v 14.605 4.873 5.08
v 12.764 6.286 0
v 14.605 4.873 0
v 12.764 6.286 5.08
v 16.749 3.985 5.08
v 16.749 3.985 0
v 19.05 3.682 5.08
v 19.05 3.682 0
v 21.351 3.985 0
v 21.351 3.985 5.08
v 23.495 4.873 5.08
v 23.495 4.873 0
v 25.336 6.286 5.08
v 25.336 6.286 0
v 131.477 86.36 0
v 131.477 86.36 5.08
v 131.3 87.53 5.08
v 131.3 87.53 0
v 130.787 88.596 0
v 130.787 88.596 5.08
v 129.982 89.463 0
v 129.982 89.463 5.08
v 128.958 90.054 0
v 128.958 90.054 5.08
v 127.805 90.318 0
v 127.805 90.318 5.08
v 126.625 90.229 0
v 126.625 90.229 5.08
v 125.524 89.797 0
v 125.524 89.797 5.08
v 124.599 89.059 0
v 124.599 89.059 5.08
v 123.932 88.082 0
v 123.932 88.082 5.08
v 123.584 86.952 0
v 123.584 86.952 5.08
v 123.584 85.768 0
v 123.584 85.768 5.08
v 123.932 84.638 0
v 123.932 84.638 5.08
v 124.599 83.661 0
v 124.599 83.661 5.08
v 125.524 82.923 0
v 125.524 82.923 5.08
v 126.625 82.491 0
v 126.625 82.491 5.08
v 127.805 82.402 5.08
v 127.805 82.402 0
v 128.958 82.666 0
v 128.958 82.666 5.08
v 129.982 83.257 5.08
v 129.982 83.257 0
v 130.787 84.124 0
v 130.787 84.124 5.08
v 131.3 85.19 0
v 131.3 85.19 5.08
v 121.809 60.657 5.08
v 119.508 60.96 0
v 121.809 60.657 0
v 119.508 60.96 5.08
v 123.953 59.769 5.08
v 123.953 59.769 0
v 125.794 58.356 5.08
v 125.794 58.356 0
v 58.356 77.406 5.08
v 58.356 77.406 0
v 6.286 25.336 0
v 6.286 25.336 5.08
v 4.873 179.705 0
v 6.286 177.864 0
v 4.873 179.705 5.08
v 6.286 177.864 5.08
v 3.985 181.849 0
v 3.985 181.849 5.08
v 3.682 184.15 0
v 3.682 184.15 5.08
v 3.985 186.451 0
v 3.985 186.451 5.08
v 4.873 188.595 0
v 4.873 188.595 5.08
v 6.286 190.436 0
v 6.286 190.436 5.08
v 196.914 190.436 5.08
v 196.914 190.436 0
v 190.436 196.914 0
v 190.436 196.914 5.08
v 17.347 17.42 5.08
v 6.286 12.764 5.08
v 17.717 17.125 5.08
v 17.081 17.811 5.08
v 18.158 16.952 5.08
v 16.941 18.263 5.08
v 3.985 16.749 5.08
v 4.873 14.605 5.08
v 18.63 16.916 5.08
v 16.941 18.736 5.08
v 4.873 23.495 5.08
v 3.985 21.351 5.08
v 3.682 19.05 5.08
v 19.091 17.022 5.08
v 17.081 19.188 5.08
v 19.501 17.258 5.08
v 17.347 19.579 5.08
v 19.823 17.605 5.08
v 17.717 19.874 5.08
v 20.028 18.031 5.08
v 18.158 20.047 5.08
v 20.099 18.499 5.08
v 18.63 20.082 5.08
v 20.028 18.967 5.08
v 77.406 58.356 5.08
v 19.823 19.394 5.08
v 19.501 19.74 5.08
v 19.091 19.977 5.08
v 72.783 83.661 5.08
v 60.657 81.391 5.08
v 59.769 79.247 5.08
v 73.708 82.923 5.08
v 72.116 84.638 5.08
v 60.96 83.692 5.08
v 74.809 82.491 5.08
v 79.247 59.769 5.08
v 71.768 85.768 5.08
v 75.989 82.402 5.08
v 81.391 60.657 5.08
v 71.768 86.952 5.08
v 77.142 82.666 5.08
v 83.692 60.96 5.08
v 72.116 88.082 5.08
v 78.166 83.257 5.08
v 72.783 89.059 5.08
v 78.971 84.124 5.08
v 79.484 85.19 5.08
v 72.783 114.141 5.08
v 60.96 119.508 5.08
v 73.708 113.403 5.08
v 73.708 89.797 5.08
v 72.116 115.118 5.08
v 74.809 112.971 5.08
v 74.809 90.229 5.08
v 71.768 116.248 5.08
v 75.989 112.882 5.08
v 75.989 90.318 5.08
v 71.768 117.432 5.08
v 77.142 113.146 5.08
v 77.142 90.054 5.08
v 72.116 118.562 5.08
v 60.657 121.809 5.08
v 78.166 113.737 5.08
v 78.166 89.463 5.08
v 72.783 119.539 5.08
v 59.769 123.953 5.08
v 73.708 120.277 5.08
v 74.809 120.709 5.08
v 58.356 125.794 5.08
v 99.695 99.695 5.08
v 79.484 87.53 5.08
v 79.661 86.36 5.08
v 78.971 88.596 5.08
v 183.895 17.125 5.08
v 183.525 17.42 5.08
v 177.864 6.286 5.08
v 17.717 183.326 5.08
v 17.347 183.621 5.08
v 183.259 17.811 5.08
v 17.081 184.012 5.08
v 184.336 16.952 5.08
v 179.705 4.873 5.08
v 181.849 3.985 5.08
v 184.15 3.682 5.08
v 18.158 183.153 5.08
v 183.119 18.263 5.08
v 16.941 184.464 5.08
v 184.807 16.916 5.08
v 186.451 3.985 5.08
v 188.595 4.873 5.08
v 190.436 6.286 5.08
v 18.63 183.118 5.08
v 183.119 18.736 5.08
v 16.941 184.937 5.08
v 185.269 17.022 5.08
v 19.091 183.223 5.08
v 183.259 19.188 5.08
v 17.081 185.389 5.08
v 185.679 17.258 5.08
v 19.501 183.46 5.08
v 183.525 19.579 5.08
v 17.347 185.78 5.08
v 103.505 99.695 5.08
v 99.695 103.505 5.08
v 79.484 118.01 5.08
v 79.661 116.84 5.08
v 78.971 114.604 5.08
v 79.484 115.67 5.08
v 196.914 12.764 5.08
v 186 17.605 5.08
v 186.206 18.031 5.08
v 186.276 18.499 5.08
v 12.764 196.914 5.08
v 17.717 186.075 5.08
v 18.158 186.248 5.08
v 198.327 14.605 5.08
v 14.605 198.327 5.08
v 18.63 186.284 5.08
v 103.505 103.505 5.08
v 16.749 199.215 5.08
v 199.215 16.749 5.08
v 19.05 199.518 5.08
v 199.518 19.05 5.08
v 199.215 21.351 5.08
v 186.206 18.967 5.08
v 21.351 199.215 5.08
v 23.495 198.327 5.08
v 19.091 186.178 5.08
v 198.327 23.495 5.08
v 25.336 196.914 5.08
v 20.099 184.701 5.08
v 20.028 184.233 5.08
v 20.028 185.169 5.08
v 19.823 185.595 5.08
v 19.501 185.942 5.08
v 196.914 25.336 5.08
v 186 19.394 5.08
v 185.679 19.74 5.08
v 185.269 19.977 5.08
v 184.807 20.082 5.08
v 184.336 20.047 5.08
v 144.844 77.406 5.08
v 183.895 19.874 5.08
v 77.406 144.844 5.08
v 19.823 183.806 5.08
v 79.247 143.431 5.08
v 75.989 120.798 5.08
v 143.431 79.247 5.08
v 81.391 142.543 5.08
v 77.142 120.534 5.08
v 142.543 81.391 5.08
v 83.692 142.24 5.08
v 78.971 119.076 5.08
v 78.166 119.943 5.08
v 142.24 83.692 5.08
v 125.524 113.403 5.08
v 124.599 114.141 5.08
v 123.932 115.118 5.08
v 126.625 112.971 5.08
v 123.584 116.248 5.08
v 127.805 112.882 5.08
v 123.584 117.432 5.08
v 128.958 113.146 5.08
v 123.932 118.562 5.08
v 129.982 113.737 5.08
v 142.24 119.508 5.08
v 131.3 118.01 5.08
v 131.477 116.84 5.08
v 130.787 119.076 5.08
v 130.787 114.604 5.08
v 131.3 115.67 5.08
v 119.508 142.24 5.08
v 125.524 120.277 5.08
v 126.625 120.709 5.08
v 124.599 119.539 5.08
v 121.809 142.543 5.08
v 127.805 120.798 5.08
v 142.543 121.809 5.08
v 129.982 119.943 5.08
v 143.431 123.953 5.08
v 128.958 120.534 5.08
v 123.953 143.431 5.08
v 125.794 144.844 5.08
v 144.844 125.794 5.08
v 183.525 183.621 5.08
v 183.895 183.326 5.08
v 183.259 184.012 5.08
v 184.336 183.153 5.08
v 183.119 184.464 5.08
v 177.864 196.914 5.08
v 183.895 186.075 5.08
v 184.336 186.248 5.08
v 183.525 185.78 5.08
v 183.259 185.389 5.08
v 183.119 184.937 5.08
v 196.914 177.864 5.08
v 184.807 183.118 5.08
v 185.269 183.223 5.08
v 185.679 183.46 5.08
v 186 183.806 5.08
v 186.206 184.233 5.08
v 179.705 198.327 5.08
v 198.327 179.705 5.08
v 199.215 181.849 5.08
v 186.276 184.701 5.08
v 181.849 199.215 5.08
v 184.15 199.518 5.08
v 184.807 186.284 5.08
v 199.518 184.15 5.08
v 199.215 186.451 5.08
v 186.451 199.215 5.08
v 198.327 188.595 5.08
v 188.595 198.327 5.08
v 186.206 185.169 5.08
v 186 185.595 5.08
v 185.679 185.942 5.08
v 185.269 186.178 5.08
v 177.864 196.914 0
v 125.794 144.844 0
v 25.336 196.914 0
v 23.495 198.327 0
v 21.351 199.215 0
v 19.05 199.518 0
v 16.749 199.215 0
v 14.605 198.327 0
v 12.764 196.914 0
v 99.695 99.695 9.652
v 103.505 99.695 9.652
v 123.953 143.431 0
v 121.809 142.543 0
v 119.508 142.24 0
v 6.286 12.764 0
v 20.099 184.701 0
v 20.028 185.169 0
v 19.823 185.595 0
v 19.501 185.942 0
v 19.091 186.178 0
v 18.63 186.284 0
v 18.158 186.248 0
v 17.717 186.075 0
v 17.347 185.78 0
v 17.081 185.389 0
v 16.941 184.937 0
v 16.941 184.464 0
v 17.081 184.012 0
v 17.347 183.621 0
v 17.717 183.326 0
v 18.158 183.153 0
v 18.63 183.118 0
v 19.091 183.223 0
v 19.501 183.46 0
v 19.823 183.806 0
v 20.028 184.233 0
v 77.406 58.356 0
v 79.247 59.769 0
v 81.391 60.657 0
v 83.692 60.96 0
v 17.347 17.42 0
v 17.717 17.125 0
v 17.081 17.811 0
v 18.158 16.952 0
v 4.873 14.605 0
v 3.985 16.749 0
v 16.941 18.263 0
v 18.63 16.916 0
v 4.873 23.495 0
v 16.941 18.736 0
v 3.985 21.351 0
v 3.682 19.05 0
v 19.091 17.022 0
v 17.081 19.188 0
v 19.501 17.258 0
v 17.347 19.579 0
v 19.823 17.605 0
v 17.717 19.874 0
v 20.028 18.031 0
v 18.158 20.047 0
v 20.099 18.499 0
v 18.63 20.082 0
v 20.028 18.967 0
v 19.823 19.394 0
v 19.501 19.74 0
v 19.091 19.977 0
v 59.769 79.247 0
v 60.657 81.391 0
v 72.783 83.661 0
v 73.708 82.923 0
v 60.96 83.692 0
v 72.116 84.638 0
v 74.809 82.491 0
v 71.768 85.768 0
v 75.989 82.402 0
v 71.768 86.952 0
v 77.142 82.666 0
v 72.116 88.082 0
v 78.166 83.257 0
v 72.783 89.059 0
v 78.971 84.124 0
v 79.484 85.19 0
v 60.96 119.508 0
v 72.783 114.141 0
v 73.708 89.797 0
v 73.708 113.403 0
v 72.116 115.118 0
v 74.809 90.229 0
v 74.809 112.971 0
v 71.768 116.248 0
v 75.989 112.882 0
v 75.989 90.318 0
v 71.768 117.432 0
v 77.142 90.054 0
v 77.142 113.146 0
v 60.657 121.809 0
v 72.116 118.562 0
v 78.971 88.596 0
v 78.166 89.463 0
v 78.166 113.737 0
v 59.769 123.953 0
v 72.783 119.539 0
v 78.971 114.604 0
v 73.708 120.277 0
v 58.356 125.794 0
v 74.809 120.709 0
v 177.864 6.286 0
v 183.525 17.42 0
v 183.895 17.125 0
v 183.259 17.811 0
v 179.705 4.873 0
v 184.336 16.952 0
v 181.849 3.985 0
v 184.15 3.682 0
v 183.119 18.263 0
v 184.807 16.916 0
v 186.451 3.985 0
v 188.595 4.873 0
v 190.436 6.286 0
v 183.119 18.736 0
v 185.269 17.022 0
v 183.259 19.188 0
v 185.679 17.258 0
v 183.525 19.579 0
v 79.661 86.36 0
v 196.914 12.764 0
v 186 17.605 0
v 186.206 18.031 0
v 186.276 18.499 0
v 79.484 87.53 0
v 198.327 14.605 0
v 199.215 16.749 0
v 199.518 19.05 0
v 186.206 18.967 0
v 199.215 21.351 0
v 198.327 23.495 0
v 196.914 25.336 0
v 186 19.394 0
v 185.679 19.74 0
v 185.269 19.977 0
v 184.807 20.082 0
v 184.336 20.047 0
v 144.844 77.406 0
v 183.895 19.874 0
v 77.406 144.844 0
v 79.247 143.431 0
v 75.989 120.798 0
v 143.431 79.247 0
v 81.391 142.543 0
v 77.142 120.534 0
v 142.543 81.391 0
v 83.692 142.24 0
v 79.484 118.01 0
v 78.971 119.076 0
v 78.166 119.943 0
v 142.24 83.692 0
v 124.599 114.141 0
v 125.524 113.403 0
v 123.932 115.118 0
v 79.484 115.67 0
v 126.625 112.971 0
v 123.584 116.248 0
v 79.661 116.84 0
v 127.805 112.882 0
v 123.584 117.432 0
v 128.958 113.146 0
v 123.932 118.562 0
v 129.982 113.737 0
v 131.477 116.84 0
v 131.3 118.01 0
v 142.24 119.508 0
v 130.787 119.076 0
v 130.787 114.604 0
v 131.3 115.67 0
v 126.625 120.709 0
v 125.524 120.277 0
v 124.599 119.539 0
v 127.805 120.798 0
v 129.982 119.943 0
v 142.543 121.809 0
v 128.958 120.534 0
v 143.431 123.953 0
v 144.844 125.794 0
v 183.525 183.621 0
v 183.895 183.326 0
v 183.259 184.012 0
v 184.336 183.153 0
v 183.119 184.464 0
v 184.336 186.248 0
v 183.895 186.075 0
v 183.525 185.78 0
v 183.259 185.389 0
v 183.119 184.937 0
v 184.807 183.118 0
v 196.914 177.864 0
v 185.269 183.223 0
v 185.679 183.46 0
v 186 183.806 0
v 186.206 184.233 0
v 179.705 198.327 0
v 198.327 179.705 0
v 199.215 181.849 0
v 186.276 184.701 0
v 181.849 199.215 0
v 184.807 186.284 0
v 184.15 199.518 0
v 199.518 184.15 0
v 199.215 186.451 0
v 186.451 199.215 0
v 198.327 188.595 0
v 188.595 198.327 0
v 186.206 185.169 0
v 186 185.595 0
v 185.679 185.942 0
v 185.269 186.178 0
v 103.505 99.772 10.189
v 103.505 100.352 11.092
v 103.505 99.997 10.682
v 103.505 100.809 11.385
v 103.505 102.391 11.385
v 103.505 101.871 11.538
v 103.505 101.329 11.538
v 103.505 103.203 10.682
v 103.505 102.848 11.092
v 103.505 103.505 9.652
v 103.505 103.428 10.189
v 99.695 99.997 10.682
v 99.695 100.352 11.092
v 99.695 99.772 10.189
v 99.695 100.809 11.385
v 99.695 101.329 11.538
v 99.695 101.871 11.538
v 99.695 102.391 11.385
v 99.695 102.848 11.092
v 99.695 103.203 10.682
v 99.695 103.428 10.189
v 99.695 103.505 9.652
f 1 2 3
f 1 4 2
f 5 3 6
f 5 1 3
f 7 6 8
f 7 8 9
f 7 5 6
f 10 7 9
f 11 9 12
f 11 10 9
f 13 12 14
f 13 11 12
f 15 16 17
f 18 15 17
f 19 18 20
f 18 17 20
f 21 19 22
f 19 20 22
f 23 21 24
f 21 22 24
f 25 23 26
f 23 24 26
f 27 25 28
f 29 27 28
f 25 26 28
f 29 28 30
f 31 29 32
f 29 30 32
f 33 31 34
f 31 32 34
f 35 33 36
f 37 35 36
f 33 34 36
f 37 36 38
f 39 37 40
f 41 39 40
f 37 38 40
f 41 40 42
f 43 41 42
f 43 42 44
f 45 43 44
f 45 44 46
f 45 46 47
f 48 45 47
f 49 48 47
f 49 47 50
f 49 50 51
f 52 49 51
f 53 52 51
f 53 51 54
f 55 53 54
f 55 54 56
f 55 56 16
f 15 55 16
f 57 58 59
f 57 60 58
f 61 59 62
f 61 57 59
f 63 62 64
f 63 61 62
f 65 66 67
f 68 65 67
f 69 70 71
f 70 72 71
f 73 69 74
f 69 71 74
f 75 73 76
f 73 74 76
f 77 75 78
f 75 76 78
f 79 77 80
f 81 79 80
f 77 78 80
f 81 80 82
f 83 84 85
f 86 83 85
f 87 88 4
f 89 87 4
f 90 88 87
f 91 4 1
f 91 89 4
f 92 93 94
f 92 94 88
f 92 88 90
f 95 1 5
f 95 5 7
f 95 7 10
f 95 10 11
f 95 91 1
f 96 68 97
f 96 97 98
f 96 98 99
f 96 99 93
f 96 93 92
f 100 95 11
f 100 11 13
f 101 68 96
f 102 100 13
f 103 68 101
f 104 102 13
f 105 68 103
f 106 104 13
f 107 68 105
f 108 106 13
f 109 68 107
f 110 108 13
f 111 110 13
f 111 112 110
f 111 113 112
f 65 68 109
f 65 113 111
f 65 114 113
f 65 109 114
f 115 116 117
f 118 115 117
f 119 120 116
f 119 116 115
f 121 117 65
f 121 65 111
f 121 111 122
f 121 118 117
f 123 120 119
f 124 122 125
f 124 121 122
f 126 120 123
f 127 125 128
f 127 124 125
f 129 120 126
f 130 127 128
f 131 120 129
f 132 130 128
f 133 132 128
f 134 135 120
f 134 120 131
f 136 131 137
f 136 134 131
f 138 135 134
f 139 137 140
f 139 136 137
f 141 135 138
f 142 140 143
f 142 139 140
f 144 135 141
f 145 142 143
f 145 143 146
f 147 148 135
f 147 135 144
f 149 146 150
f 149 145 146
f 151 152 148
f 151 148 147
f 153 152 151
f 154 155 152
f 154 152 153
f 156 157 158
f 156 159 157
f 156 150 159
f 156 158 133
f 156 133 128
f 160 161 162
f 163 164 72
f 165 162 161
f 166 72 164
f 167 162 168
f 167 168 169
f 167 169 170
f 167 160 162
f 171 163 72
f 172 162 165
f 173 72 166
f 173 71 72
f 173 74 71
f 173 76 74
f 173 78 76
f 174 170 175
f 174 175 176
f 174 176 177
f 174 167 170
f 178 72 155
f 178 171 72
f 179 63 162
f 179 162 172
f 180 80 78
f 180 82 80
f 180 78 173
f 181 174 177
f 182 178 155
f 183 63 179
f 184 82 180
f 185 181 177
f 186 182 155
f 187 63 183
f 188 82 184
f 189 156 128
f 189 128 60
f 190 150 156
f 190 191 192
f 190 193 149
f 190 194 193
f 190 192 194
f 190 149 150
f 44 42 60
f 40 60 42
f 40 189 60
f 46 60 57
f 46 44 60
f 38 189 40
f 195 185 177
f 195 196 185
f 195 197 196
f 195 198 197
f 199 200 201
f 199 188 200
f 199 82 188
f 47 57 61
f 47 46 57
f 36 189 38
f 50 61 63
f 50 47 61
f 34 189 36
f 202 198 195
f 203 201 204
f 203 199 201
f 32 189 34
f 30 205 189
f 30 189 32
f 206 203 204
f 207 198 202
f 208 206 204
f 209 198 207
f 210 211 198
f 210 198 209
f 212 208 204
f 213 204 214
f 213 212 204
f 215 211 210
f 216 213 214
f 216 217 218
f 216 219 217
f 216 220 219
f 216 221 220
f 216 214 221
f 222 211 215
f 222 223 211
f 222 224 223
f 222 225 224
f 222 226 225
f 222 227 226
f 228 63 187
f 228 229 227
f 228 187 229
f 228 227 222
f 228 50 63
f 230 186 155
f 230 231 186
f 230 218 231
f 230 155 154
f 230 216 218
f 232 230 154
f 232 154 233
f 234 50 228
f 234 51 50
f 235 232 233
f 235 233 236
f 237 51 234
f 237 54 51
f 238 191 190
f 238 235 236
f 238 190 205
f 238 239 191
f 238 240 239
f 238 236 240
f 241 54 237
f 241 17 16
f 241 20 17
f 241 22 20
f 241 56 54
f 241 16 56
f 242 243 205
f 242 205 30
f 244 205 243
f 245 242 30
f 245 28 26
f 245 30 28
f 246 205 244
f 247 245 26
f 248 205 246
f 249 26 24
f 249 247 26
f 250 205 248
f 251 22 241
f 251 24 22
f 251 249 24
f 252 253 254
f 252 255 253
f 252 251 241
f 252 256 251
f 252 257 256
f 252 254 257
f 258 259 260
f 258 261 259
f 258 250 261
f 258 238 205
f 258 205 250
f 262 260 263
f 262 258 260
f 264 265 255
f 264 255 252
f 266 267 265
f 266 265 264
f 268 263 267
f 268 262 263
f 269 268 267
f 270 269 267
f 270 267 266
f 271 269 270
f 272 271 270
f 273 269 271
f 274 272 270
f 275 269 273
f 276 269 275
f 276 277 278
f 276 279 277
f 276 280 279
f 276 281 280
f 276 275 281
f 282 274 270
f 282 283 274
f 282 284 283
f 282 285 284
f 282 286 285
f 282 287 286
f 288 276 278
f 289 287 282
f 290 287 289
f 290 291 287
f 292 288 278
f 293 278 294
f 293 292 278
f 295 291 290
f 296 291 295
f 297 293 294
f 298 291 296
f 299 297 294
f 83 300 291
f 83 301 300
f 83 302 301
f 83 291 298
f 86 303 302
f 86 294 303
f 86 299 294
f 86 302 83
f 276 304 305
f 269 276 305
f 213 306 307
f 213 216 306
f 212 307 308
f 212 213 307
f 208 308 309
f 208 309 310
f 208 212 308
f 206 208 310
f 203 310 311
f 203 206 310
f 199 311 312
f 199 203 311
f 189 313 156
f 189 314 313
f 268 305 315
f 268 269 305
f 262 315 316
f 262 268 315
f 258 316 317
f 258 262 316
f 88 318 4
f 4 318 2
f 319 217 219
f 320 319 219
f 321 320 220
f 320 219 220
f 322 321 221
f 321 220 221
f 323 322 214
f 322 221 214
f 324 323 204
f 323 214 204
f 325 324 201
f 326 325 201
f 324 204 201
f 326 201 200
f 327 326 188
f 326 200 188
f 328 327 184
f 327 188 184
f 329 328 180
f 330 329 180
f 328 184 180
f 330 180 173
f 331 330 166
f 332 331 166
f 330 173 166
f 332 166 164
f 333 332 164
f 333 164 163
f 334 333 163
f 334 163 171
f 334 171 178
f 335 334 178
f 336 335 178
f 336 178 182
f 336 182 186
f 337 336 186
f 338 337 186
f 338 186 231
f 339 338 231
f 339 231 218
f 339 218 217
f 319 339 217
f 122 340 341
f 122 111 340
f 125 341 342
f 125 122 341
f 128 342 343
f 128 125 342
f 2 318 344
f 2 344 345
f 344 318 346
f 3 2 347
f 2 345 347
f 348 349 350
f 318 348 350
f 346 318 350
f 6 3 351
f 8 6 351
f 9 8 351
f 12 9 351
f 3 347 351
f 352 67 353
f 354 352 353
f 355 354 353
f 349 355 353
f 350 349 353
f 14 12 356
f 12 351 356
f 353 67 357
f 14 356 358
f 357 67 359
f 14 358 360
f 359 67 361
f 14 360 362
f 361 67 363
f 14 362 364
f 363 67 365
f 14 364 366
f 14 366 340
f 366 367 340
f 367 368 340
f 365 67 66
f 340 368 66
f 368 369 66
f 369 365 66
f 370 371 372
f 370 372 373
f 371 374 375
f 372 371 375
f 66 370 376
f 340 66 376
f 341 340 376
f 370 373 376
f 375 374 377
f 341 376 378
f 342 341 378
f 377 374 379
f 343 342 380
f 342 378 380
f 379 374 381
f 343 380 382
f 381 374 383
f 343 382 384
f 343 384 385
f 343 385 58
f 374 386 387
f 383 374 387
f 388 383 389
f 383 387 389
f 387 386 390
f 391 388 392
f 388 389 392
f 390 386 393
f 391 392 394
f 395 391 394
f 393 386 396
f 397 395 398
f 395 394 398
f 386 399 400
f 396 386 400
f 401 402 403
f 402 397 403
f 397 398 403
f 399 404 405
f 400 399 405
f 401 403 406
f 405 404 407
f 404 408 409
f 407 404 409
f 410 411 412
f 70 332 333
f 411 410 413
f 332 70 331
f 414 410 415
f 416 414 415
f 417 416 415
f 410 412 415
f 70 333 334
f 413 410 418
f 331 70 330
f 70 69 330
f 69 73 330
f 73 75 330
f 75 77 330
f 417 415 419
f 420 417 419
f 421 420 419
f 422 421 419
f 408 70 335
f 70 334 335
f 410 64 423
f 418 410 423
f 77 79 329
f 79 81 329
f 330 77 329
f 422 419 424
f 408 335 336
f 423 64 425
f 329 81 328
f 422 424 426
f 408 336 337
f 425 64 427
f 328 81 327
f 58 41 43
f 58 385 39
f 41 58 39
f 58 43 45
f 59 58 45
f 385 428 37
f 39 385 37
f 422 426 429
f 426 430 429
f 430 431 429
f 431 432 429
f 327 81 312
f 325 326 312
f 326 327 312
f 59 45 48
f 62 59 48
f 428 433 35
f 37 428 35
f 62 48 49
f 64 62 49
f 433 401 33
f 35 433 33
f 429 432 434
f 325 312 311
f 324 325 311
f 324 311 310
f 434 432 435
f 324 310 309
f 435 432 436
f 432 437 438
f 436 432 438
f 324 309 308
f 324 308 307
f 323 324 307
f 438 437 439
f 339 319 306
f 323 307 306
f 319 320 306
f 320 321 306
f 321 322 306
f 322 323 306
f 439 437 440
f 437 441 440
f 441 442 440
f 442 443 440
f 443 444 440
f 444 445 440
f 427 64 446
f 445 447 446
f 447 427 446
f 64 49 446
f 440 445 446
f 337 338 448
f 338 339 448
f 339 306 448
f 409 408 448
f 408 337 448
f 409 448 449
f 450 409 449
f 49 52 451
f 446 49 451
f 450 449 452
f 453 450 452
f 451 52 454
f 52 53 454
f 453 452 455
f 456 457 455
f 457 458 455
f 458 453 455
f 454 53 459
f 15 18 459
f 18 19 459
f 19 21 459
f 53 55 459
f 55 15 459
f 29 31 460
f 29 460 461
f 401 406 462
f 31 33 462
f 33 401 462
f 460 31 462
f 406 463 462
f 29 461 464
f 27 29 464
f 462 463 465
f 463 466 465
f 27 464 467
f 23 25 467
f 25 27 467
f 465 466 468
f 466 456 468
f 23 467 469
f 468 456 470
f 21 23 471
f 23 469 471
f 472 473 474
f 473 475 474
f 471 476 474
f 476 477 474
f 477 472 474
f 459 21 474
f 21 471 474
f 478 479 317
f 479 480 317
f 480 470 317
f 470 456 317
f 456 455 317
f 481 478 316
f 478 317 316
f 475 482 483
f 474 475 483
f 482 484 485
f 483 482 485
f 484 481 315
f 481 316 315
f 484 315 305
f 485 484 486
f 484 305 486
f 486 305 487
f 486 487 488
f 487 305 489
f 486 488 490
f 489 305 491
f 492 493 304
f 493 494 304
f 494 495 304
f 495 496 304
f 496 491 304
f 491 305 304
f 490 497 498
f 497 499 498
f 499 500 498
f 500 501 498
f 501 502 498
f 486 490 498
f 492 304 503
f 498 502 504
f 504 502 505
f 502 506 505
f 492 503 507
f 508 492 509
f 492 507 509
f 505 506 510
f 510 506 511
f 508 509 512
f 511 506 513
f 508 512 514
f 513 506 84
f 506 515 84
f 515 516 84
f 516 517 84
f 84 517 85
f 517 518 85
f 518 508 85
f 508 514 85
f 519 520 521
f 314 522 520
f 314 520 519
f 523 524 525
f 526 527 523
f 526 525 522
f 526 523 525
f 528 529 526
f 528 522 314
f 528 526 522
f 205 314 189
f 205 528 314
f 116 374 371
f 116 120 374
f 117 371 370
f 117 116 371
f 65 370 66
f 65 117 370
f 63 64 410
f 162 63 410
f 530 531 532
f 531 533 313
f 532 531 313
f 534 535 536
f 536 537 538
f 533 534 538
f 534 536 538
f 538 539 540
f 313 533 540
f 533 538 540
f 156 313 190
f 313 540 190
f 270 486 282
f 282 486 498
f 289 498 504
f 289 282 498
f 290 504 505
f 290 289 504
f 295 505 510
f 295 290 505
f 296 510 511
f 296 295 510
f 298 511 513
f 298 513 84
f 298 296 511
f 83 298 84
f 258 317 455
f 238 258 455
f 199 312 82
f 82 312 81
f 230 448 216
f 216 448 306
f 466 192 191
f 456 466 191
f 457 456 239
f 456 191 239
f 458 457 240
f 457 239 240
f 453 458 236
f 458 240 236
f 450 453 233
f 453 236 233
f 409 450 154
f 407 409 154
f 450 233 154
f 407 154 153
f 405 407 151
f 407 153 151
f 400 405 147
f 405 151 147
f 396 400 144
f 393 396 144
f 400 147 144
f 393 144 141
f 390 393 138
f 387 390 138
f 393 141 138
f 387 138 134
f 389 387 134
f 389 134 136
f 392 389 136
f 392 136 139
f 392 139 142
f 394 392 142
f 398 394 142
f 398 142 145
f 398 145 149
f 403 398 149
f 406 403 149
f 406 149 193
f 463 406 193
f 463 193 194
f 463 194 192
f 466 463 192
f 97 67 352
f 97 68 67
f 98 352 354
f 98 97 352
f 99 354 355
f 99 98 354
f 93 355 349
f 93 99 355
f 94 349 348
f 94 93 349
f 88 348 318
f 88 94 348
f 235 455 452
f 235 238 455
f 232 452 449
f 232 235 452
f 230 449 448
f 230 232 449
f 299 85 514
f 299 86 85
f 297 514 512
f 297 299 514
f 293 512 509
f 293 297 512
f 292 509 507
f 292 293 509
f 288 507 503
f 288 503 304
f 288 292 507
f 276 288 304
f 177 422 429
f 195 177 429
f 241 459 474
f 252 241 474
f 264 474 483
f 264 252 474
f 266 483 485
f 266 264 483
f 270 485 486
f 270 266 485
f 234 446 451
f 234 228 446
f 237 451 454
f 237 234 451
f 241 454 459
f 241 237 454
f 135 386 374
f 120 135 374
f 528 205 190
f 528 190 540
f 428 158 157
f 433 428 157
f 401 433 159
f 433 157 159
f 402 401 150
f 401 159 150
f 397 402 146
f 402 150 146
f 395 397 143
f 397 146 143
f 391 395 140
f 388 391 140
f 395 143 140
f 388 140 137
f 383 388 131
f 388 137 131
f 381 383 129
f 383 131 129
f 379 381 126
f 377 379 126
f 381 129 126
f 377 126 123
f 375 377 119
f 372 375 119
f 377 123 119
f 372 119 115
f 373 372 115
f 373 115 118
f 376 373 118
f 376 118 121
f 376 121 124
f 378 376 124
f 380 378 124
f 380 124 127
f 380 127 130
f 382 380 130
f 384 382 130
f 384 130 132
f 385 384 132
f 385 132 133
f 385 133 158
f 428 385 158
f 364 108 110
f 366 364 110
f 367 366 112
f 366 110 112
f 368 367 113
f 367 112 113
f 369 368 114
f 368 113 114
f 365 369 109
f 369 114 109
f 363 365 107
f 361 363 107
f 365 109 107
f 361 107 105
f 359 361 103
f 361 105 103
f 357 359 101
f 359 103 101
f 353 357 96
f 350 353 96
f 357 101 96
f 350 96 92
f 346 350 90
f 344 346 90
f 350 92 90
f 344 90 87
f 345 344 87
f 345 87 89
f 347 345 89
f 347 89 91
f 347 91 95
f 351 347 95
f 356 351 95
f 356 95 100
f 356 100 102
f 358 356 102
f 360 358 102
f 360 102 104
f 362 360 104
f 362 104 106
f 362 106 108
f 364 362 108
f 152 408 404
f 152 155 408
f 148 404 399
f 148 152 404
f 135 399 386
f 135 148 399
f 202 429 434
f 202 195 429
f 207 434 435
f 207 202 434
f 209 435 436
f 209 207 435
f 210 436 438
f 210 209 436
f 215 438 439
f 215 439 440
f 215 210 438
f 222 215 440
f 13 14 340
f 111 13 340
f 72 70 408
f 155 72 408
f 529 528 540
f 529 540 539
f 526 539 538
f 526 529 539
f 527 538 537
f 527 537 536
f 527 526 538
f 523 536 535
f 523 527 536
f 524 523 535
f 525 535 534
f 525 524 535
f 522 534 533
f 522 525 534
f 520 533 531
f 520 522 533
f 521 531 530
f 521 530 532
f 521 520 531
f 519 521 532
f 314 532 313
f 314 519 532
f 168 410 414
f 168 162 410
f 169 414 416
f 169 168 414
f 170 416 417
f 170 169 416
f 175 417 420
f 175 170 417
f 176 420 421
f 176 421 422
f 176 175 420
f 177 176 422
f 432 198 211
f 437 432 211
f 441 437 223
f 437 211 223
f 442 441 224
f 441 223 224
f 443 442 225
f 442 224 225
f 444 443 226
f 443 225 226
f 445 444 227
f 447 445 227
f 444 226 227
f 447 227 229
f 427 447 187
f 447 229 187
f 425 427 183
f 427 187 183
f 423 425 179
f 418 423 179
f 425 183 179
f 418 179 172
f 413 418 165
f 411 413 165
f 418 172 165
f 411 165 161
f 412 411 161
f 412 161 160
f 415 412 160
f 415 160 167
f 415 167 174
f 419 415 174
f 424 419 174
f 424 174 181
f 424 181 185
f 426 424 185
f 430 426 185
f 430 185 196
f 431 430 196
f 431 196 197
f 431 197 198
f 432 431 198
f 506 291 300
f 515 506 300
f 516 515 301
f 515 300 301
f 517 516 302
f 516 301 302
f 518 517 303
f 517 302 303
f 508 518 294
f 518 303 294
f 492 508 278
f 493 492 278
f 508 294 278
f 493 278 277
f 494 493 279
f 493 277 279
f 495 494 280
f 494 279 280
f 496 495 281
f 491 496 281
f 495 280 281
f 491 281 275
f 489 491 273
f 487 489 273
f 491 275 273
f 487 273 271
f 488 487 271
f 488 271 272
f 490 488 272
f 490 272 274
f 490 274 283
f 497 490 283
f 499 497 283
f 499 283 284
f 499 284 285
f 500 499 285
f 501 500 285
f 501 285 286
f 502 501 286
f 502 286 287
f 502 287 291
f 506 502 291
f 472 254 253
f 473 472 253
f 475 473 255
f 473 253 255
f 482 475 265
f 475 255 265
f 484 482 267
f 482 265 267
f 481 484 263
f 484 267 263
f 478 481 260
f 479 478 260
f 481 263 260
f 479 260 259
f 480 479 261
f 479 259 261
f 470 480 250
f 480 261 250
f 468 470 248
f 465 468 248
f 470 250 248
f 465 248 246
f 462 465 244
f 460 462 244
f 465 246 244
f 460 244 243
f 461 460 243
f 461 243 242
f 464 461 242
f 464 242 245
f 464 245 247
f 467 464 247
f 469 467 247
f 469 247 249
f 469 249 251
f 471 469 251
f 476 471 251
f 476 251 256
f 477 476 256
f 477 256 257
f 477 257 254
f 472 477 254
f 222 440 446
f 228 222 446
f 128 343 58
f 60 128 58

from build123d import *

# Parameters (mm, degrees)
BOSS_EXTRUDE1_DEPTH = 5.08
FILLET1_R           = 8.89
SKETCH2_R           = 3.96875
CUT_EXTRUDE1_DEPTH  = 6.08
SKETCH3_R           = 1.5875
CUT_EXTRUDE2_DEPTH  = 6.08
BOSS_EXTRUDE3_DEPTH = 1.905


with BuildPart() as part:
    # Sketch1 → Boss-Extrude1 (new body)
    with BuildSketch(Plane.XY):
        Polygon((0, 184.15), (60.96, 123.19), (60.96, 80.01), (0, 19.05), (19.05, 0), (80.01, 60.96), (123.19, 60.96), (184.15, 0), (203.2, 19.05), (142.24, 80.01), (142.24, 123.19), (203.2, 184.15), (184.15, 203.2), (123.19, 142.24), (80.01, 142.24), (19.05, 203.2), align=None)
    extrude(amount=BOSS_EXTRUDE1_DEPTH)

    # Fillet1
    fillet1_edges = [part.edges().sort_by_distance(p)[0] for p in [
        (19.05, 203.2, 2.54),
        (80.01, 142.24, 2.54),
        (123.19, 142.24, 2.54),
        (184.15, 203.2, 2.54),
        (203.2, 184.15, 2.54),
        (142.24, 123.19, 2.54),
        (142.24, 80.01, 2.54),
        (203.2, 19.05, 2.54),
        (184.15, 0, 2.54),
        (123.19, 60.96, 2.54),
        (80.01, 60.96, 2.54),
        (19.05, 0, 2.54),
        (0, 19.05, 2.54),
        (60.96, 80.01, 2.54),
        (60.96, 123.19, 2.54),
        (0, 184.15, 2.54),
    ]]
    fillet(fillet1_edges, radius=FILLET1_R)

    # Sketch2 → Cut-Extrude1 (cut, through all)
    with BuildSketch(Plane.XY.offset(5.08)):
        with Locations((127.508, 86.36)):
            Circle(SKETCH2_R)
        with Locations((127.508, 116.84)):
            Circle(SKETCH2_R)
        with Locations((75.692, 86.36)):
            Circle(SKETCH2_R)
        with Locations((75.692, 116.84)):
            Circle(SKETCH2_R)
    extrude(amount=-CUT_EXTRUDE1_DEPTH, mode=Mode.SUBTRACT)

    # Sketch3 → Cut-Extrude2 (cut, through all)
    with BuildSketch(Plane.XY.offset(5.08)):
        with Locations((184.688815367, 184.700672391)):
            Circle(SKETCH3_R)
        with Locations((18.511184633, 184.700672391)):
            Circle(SKETCH3_R)
        with Locations((18.511184633, 18.499327609)):
            Circle(SKETCH3_R)
        with Locations((184.688815367, 18.499327609)):
            Circle(SKETCH3_R)
    extrude(amount=-CUT_EXTRUDE2_DEPTH, mode=Mode.SUBTRACT)

    # Sketch5 → Boss-Extrude3 (add, symmetric)
    with BuildSketch(Plane(origin=(101.6, 0, 0), x_dir=(0, 0, -1), z_dir=(1, 0, 0))):
        with BuildLine():
            Line((-5.08, 99.695), (-5.08, 103.505))
            Line((-5.08, 103.505), (-9.652, 103.505))
            ThreePointArc((-9.652, 103.505), (-11.557, 101.6), (-9.652, 99.695))
            Line((-9.652, 99.695), (-5.08, 99.695))
        make_face()
    extrude(amount=BOSS_EXTRUDE3_DEPTH, both=True)


solid = part.part
